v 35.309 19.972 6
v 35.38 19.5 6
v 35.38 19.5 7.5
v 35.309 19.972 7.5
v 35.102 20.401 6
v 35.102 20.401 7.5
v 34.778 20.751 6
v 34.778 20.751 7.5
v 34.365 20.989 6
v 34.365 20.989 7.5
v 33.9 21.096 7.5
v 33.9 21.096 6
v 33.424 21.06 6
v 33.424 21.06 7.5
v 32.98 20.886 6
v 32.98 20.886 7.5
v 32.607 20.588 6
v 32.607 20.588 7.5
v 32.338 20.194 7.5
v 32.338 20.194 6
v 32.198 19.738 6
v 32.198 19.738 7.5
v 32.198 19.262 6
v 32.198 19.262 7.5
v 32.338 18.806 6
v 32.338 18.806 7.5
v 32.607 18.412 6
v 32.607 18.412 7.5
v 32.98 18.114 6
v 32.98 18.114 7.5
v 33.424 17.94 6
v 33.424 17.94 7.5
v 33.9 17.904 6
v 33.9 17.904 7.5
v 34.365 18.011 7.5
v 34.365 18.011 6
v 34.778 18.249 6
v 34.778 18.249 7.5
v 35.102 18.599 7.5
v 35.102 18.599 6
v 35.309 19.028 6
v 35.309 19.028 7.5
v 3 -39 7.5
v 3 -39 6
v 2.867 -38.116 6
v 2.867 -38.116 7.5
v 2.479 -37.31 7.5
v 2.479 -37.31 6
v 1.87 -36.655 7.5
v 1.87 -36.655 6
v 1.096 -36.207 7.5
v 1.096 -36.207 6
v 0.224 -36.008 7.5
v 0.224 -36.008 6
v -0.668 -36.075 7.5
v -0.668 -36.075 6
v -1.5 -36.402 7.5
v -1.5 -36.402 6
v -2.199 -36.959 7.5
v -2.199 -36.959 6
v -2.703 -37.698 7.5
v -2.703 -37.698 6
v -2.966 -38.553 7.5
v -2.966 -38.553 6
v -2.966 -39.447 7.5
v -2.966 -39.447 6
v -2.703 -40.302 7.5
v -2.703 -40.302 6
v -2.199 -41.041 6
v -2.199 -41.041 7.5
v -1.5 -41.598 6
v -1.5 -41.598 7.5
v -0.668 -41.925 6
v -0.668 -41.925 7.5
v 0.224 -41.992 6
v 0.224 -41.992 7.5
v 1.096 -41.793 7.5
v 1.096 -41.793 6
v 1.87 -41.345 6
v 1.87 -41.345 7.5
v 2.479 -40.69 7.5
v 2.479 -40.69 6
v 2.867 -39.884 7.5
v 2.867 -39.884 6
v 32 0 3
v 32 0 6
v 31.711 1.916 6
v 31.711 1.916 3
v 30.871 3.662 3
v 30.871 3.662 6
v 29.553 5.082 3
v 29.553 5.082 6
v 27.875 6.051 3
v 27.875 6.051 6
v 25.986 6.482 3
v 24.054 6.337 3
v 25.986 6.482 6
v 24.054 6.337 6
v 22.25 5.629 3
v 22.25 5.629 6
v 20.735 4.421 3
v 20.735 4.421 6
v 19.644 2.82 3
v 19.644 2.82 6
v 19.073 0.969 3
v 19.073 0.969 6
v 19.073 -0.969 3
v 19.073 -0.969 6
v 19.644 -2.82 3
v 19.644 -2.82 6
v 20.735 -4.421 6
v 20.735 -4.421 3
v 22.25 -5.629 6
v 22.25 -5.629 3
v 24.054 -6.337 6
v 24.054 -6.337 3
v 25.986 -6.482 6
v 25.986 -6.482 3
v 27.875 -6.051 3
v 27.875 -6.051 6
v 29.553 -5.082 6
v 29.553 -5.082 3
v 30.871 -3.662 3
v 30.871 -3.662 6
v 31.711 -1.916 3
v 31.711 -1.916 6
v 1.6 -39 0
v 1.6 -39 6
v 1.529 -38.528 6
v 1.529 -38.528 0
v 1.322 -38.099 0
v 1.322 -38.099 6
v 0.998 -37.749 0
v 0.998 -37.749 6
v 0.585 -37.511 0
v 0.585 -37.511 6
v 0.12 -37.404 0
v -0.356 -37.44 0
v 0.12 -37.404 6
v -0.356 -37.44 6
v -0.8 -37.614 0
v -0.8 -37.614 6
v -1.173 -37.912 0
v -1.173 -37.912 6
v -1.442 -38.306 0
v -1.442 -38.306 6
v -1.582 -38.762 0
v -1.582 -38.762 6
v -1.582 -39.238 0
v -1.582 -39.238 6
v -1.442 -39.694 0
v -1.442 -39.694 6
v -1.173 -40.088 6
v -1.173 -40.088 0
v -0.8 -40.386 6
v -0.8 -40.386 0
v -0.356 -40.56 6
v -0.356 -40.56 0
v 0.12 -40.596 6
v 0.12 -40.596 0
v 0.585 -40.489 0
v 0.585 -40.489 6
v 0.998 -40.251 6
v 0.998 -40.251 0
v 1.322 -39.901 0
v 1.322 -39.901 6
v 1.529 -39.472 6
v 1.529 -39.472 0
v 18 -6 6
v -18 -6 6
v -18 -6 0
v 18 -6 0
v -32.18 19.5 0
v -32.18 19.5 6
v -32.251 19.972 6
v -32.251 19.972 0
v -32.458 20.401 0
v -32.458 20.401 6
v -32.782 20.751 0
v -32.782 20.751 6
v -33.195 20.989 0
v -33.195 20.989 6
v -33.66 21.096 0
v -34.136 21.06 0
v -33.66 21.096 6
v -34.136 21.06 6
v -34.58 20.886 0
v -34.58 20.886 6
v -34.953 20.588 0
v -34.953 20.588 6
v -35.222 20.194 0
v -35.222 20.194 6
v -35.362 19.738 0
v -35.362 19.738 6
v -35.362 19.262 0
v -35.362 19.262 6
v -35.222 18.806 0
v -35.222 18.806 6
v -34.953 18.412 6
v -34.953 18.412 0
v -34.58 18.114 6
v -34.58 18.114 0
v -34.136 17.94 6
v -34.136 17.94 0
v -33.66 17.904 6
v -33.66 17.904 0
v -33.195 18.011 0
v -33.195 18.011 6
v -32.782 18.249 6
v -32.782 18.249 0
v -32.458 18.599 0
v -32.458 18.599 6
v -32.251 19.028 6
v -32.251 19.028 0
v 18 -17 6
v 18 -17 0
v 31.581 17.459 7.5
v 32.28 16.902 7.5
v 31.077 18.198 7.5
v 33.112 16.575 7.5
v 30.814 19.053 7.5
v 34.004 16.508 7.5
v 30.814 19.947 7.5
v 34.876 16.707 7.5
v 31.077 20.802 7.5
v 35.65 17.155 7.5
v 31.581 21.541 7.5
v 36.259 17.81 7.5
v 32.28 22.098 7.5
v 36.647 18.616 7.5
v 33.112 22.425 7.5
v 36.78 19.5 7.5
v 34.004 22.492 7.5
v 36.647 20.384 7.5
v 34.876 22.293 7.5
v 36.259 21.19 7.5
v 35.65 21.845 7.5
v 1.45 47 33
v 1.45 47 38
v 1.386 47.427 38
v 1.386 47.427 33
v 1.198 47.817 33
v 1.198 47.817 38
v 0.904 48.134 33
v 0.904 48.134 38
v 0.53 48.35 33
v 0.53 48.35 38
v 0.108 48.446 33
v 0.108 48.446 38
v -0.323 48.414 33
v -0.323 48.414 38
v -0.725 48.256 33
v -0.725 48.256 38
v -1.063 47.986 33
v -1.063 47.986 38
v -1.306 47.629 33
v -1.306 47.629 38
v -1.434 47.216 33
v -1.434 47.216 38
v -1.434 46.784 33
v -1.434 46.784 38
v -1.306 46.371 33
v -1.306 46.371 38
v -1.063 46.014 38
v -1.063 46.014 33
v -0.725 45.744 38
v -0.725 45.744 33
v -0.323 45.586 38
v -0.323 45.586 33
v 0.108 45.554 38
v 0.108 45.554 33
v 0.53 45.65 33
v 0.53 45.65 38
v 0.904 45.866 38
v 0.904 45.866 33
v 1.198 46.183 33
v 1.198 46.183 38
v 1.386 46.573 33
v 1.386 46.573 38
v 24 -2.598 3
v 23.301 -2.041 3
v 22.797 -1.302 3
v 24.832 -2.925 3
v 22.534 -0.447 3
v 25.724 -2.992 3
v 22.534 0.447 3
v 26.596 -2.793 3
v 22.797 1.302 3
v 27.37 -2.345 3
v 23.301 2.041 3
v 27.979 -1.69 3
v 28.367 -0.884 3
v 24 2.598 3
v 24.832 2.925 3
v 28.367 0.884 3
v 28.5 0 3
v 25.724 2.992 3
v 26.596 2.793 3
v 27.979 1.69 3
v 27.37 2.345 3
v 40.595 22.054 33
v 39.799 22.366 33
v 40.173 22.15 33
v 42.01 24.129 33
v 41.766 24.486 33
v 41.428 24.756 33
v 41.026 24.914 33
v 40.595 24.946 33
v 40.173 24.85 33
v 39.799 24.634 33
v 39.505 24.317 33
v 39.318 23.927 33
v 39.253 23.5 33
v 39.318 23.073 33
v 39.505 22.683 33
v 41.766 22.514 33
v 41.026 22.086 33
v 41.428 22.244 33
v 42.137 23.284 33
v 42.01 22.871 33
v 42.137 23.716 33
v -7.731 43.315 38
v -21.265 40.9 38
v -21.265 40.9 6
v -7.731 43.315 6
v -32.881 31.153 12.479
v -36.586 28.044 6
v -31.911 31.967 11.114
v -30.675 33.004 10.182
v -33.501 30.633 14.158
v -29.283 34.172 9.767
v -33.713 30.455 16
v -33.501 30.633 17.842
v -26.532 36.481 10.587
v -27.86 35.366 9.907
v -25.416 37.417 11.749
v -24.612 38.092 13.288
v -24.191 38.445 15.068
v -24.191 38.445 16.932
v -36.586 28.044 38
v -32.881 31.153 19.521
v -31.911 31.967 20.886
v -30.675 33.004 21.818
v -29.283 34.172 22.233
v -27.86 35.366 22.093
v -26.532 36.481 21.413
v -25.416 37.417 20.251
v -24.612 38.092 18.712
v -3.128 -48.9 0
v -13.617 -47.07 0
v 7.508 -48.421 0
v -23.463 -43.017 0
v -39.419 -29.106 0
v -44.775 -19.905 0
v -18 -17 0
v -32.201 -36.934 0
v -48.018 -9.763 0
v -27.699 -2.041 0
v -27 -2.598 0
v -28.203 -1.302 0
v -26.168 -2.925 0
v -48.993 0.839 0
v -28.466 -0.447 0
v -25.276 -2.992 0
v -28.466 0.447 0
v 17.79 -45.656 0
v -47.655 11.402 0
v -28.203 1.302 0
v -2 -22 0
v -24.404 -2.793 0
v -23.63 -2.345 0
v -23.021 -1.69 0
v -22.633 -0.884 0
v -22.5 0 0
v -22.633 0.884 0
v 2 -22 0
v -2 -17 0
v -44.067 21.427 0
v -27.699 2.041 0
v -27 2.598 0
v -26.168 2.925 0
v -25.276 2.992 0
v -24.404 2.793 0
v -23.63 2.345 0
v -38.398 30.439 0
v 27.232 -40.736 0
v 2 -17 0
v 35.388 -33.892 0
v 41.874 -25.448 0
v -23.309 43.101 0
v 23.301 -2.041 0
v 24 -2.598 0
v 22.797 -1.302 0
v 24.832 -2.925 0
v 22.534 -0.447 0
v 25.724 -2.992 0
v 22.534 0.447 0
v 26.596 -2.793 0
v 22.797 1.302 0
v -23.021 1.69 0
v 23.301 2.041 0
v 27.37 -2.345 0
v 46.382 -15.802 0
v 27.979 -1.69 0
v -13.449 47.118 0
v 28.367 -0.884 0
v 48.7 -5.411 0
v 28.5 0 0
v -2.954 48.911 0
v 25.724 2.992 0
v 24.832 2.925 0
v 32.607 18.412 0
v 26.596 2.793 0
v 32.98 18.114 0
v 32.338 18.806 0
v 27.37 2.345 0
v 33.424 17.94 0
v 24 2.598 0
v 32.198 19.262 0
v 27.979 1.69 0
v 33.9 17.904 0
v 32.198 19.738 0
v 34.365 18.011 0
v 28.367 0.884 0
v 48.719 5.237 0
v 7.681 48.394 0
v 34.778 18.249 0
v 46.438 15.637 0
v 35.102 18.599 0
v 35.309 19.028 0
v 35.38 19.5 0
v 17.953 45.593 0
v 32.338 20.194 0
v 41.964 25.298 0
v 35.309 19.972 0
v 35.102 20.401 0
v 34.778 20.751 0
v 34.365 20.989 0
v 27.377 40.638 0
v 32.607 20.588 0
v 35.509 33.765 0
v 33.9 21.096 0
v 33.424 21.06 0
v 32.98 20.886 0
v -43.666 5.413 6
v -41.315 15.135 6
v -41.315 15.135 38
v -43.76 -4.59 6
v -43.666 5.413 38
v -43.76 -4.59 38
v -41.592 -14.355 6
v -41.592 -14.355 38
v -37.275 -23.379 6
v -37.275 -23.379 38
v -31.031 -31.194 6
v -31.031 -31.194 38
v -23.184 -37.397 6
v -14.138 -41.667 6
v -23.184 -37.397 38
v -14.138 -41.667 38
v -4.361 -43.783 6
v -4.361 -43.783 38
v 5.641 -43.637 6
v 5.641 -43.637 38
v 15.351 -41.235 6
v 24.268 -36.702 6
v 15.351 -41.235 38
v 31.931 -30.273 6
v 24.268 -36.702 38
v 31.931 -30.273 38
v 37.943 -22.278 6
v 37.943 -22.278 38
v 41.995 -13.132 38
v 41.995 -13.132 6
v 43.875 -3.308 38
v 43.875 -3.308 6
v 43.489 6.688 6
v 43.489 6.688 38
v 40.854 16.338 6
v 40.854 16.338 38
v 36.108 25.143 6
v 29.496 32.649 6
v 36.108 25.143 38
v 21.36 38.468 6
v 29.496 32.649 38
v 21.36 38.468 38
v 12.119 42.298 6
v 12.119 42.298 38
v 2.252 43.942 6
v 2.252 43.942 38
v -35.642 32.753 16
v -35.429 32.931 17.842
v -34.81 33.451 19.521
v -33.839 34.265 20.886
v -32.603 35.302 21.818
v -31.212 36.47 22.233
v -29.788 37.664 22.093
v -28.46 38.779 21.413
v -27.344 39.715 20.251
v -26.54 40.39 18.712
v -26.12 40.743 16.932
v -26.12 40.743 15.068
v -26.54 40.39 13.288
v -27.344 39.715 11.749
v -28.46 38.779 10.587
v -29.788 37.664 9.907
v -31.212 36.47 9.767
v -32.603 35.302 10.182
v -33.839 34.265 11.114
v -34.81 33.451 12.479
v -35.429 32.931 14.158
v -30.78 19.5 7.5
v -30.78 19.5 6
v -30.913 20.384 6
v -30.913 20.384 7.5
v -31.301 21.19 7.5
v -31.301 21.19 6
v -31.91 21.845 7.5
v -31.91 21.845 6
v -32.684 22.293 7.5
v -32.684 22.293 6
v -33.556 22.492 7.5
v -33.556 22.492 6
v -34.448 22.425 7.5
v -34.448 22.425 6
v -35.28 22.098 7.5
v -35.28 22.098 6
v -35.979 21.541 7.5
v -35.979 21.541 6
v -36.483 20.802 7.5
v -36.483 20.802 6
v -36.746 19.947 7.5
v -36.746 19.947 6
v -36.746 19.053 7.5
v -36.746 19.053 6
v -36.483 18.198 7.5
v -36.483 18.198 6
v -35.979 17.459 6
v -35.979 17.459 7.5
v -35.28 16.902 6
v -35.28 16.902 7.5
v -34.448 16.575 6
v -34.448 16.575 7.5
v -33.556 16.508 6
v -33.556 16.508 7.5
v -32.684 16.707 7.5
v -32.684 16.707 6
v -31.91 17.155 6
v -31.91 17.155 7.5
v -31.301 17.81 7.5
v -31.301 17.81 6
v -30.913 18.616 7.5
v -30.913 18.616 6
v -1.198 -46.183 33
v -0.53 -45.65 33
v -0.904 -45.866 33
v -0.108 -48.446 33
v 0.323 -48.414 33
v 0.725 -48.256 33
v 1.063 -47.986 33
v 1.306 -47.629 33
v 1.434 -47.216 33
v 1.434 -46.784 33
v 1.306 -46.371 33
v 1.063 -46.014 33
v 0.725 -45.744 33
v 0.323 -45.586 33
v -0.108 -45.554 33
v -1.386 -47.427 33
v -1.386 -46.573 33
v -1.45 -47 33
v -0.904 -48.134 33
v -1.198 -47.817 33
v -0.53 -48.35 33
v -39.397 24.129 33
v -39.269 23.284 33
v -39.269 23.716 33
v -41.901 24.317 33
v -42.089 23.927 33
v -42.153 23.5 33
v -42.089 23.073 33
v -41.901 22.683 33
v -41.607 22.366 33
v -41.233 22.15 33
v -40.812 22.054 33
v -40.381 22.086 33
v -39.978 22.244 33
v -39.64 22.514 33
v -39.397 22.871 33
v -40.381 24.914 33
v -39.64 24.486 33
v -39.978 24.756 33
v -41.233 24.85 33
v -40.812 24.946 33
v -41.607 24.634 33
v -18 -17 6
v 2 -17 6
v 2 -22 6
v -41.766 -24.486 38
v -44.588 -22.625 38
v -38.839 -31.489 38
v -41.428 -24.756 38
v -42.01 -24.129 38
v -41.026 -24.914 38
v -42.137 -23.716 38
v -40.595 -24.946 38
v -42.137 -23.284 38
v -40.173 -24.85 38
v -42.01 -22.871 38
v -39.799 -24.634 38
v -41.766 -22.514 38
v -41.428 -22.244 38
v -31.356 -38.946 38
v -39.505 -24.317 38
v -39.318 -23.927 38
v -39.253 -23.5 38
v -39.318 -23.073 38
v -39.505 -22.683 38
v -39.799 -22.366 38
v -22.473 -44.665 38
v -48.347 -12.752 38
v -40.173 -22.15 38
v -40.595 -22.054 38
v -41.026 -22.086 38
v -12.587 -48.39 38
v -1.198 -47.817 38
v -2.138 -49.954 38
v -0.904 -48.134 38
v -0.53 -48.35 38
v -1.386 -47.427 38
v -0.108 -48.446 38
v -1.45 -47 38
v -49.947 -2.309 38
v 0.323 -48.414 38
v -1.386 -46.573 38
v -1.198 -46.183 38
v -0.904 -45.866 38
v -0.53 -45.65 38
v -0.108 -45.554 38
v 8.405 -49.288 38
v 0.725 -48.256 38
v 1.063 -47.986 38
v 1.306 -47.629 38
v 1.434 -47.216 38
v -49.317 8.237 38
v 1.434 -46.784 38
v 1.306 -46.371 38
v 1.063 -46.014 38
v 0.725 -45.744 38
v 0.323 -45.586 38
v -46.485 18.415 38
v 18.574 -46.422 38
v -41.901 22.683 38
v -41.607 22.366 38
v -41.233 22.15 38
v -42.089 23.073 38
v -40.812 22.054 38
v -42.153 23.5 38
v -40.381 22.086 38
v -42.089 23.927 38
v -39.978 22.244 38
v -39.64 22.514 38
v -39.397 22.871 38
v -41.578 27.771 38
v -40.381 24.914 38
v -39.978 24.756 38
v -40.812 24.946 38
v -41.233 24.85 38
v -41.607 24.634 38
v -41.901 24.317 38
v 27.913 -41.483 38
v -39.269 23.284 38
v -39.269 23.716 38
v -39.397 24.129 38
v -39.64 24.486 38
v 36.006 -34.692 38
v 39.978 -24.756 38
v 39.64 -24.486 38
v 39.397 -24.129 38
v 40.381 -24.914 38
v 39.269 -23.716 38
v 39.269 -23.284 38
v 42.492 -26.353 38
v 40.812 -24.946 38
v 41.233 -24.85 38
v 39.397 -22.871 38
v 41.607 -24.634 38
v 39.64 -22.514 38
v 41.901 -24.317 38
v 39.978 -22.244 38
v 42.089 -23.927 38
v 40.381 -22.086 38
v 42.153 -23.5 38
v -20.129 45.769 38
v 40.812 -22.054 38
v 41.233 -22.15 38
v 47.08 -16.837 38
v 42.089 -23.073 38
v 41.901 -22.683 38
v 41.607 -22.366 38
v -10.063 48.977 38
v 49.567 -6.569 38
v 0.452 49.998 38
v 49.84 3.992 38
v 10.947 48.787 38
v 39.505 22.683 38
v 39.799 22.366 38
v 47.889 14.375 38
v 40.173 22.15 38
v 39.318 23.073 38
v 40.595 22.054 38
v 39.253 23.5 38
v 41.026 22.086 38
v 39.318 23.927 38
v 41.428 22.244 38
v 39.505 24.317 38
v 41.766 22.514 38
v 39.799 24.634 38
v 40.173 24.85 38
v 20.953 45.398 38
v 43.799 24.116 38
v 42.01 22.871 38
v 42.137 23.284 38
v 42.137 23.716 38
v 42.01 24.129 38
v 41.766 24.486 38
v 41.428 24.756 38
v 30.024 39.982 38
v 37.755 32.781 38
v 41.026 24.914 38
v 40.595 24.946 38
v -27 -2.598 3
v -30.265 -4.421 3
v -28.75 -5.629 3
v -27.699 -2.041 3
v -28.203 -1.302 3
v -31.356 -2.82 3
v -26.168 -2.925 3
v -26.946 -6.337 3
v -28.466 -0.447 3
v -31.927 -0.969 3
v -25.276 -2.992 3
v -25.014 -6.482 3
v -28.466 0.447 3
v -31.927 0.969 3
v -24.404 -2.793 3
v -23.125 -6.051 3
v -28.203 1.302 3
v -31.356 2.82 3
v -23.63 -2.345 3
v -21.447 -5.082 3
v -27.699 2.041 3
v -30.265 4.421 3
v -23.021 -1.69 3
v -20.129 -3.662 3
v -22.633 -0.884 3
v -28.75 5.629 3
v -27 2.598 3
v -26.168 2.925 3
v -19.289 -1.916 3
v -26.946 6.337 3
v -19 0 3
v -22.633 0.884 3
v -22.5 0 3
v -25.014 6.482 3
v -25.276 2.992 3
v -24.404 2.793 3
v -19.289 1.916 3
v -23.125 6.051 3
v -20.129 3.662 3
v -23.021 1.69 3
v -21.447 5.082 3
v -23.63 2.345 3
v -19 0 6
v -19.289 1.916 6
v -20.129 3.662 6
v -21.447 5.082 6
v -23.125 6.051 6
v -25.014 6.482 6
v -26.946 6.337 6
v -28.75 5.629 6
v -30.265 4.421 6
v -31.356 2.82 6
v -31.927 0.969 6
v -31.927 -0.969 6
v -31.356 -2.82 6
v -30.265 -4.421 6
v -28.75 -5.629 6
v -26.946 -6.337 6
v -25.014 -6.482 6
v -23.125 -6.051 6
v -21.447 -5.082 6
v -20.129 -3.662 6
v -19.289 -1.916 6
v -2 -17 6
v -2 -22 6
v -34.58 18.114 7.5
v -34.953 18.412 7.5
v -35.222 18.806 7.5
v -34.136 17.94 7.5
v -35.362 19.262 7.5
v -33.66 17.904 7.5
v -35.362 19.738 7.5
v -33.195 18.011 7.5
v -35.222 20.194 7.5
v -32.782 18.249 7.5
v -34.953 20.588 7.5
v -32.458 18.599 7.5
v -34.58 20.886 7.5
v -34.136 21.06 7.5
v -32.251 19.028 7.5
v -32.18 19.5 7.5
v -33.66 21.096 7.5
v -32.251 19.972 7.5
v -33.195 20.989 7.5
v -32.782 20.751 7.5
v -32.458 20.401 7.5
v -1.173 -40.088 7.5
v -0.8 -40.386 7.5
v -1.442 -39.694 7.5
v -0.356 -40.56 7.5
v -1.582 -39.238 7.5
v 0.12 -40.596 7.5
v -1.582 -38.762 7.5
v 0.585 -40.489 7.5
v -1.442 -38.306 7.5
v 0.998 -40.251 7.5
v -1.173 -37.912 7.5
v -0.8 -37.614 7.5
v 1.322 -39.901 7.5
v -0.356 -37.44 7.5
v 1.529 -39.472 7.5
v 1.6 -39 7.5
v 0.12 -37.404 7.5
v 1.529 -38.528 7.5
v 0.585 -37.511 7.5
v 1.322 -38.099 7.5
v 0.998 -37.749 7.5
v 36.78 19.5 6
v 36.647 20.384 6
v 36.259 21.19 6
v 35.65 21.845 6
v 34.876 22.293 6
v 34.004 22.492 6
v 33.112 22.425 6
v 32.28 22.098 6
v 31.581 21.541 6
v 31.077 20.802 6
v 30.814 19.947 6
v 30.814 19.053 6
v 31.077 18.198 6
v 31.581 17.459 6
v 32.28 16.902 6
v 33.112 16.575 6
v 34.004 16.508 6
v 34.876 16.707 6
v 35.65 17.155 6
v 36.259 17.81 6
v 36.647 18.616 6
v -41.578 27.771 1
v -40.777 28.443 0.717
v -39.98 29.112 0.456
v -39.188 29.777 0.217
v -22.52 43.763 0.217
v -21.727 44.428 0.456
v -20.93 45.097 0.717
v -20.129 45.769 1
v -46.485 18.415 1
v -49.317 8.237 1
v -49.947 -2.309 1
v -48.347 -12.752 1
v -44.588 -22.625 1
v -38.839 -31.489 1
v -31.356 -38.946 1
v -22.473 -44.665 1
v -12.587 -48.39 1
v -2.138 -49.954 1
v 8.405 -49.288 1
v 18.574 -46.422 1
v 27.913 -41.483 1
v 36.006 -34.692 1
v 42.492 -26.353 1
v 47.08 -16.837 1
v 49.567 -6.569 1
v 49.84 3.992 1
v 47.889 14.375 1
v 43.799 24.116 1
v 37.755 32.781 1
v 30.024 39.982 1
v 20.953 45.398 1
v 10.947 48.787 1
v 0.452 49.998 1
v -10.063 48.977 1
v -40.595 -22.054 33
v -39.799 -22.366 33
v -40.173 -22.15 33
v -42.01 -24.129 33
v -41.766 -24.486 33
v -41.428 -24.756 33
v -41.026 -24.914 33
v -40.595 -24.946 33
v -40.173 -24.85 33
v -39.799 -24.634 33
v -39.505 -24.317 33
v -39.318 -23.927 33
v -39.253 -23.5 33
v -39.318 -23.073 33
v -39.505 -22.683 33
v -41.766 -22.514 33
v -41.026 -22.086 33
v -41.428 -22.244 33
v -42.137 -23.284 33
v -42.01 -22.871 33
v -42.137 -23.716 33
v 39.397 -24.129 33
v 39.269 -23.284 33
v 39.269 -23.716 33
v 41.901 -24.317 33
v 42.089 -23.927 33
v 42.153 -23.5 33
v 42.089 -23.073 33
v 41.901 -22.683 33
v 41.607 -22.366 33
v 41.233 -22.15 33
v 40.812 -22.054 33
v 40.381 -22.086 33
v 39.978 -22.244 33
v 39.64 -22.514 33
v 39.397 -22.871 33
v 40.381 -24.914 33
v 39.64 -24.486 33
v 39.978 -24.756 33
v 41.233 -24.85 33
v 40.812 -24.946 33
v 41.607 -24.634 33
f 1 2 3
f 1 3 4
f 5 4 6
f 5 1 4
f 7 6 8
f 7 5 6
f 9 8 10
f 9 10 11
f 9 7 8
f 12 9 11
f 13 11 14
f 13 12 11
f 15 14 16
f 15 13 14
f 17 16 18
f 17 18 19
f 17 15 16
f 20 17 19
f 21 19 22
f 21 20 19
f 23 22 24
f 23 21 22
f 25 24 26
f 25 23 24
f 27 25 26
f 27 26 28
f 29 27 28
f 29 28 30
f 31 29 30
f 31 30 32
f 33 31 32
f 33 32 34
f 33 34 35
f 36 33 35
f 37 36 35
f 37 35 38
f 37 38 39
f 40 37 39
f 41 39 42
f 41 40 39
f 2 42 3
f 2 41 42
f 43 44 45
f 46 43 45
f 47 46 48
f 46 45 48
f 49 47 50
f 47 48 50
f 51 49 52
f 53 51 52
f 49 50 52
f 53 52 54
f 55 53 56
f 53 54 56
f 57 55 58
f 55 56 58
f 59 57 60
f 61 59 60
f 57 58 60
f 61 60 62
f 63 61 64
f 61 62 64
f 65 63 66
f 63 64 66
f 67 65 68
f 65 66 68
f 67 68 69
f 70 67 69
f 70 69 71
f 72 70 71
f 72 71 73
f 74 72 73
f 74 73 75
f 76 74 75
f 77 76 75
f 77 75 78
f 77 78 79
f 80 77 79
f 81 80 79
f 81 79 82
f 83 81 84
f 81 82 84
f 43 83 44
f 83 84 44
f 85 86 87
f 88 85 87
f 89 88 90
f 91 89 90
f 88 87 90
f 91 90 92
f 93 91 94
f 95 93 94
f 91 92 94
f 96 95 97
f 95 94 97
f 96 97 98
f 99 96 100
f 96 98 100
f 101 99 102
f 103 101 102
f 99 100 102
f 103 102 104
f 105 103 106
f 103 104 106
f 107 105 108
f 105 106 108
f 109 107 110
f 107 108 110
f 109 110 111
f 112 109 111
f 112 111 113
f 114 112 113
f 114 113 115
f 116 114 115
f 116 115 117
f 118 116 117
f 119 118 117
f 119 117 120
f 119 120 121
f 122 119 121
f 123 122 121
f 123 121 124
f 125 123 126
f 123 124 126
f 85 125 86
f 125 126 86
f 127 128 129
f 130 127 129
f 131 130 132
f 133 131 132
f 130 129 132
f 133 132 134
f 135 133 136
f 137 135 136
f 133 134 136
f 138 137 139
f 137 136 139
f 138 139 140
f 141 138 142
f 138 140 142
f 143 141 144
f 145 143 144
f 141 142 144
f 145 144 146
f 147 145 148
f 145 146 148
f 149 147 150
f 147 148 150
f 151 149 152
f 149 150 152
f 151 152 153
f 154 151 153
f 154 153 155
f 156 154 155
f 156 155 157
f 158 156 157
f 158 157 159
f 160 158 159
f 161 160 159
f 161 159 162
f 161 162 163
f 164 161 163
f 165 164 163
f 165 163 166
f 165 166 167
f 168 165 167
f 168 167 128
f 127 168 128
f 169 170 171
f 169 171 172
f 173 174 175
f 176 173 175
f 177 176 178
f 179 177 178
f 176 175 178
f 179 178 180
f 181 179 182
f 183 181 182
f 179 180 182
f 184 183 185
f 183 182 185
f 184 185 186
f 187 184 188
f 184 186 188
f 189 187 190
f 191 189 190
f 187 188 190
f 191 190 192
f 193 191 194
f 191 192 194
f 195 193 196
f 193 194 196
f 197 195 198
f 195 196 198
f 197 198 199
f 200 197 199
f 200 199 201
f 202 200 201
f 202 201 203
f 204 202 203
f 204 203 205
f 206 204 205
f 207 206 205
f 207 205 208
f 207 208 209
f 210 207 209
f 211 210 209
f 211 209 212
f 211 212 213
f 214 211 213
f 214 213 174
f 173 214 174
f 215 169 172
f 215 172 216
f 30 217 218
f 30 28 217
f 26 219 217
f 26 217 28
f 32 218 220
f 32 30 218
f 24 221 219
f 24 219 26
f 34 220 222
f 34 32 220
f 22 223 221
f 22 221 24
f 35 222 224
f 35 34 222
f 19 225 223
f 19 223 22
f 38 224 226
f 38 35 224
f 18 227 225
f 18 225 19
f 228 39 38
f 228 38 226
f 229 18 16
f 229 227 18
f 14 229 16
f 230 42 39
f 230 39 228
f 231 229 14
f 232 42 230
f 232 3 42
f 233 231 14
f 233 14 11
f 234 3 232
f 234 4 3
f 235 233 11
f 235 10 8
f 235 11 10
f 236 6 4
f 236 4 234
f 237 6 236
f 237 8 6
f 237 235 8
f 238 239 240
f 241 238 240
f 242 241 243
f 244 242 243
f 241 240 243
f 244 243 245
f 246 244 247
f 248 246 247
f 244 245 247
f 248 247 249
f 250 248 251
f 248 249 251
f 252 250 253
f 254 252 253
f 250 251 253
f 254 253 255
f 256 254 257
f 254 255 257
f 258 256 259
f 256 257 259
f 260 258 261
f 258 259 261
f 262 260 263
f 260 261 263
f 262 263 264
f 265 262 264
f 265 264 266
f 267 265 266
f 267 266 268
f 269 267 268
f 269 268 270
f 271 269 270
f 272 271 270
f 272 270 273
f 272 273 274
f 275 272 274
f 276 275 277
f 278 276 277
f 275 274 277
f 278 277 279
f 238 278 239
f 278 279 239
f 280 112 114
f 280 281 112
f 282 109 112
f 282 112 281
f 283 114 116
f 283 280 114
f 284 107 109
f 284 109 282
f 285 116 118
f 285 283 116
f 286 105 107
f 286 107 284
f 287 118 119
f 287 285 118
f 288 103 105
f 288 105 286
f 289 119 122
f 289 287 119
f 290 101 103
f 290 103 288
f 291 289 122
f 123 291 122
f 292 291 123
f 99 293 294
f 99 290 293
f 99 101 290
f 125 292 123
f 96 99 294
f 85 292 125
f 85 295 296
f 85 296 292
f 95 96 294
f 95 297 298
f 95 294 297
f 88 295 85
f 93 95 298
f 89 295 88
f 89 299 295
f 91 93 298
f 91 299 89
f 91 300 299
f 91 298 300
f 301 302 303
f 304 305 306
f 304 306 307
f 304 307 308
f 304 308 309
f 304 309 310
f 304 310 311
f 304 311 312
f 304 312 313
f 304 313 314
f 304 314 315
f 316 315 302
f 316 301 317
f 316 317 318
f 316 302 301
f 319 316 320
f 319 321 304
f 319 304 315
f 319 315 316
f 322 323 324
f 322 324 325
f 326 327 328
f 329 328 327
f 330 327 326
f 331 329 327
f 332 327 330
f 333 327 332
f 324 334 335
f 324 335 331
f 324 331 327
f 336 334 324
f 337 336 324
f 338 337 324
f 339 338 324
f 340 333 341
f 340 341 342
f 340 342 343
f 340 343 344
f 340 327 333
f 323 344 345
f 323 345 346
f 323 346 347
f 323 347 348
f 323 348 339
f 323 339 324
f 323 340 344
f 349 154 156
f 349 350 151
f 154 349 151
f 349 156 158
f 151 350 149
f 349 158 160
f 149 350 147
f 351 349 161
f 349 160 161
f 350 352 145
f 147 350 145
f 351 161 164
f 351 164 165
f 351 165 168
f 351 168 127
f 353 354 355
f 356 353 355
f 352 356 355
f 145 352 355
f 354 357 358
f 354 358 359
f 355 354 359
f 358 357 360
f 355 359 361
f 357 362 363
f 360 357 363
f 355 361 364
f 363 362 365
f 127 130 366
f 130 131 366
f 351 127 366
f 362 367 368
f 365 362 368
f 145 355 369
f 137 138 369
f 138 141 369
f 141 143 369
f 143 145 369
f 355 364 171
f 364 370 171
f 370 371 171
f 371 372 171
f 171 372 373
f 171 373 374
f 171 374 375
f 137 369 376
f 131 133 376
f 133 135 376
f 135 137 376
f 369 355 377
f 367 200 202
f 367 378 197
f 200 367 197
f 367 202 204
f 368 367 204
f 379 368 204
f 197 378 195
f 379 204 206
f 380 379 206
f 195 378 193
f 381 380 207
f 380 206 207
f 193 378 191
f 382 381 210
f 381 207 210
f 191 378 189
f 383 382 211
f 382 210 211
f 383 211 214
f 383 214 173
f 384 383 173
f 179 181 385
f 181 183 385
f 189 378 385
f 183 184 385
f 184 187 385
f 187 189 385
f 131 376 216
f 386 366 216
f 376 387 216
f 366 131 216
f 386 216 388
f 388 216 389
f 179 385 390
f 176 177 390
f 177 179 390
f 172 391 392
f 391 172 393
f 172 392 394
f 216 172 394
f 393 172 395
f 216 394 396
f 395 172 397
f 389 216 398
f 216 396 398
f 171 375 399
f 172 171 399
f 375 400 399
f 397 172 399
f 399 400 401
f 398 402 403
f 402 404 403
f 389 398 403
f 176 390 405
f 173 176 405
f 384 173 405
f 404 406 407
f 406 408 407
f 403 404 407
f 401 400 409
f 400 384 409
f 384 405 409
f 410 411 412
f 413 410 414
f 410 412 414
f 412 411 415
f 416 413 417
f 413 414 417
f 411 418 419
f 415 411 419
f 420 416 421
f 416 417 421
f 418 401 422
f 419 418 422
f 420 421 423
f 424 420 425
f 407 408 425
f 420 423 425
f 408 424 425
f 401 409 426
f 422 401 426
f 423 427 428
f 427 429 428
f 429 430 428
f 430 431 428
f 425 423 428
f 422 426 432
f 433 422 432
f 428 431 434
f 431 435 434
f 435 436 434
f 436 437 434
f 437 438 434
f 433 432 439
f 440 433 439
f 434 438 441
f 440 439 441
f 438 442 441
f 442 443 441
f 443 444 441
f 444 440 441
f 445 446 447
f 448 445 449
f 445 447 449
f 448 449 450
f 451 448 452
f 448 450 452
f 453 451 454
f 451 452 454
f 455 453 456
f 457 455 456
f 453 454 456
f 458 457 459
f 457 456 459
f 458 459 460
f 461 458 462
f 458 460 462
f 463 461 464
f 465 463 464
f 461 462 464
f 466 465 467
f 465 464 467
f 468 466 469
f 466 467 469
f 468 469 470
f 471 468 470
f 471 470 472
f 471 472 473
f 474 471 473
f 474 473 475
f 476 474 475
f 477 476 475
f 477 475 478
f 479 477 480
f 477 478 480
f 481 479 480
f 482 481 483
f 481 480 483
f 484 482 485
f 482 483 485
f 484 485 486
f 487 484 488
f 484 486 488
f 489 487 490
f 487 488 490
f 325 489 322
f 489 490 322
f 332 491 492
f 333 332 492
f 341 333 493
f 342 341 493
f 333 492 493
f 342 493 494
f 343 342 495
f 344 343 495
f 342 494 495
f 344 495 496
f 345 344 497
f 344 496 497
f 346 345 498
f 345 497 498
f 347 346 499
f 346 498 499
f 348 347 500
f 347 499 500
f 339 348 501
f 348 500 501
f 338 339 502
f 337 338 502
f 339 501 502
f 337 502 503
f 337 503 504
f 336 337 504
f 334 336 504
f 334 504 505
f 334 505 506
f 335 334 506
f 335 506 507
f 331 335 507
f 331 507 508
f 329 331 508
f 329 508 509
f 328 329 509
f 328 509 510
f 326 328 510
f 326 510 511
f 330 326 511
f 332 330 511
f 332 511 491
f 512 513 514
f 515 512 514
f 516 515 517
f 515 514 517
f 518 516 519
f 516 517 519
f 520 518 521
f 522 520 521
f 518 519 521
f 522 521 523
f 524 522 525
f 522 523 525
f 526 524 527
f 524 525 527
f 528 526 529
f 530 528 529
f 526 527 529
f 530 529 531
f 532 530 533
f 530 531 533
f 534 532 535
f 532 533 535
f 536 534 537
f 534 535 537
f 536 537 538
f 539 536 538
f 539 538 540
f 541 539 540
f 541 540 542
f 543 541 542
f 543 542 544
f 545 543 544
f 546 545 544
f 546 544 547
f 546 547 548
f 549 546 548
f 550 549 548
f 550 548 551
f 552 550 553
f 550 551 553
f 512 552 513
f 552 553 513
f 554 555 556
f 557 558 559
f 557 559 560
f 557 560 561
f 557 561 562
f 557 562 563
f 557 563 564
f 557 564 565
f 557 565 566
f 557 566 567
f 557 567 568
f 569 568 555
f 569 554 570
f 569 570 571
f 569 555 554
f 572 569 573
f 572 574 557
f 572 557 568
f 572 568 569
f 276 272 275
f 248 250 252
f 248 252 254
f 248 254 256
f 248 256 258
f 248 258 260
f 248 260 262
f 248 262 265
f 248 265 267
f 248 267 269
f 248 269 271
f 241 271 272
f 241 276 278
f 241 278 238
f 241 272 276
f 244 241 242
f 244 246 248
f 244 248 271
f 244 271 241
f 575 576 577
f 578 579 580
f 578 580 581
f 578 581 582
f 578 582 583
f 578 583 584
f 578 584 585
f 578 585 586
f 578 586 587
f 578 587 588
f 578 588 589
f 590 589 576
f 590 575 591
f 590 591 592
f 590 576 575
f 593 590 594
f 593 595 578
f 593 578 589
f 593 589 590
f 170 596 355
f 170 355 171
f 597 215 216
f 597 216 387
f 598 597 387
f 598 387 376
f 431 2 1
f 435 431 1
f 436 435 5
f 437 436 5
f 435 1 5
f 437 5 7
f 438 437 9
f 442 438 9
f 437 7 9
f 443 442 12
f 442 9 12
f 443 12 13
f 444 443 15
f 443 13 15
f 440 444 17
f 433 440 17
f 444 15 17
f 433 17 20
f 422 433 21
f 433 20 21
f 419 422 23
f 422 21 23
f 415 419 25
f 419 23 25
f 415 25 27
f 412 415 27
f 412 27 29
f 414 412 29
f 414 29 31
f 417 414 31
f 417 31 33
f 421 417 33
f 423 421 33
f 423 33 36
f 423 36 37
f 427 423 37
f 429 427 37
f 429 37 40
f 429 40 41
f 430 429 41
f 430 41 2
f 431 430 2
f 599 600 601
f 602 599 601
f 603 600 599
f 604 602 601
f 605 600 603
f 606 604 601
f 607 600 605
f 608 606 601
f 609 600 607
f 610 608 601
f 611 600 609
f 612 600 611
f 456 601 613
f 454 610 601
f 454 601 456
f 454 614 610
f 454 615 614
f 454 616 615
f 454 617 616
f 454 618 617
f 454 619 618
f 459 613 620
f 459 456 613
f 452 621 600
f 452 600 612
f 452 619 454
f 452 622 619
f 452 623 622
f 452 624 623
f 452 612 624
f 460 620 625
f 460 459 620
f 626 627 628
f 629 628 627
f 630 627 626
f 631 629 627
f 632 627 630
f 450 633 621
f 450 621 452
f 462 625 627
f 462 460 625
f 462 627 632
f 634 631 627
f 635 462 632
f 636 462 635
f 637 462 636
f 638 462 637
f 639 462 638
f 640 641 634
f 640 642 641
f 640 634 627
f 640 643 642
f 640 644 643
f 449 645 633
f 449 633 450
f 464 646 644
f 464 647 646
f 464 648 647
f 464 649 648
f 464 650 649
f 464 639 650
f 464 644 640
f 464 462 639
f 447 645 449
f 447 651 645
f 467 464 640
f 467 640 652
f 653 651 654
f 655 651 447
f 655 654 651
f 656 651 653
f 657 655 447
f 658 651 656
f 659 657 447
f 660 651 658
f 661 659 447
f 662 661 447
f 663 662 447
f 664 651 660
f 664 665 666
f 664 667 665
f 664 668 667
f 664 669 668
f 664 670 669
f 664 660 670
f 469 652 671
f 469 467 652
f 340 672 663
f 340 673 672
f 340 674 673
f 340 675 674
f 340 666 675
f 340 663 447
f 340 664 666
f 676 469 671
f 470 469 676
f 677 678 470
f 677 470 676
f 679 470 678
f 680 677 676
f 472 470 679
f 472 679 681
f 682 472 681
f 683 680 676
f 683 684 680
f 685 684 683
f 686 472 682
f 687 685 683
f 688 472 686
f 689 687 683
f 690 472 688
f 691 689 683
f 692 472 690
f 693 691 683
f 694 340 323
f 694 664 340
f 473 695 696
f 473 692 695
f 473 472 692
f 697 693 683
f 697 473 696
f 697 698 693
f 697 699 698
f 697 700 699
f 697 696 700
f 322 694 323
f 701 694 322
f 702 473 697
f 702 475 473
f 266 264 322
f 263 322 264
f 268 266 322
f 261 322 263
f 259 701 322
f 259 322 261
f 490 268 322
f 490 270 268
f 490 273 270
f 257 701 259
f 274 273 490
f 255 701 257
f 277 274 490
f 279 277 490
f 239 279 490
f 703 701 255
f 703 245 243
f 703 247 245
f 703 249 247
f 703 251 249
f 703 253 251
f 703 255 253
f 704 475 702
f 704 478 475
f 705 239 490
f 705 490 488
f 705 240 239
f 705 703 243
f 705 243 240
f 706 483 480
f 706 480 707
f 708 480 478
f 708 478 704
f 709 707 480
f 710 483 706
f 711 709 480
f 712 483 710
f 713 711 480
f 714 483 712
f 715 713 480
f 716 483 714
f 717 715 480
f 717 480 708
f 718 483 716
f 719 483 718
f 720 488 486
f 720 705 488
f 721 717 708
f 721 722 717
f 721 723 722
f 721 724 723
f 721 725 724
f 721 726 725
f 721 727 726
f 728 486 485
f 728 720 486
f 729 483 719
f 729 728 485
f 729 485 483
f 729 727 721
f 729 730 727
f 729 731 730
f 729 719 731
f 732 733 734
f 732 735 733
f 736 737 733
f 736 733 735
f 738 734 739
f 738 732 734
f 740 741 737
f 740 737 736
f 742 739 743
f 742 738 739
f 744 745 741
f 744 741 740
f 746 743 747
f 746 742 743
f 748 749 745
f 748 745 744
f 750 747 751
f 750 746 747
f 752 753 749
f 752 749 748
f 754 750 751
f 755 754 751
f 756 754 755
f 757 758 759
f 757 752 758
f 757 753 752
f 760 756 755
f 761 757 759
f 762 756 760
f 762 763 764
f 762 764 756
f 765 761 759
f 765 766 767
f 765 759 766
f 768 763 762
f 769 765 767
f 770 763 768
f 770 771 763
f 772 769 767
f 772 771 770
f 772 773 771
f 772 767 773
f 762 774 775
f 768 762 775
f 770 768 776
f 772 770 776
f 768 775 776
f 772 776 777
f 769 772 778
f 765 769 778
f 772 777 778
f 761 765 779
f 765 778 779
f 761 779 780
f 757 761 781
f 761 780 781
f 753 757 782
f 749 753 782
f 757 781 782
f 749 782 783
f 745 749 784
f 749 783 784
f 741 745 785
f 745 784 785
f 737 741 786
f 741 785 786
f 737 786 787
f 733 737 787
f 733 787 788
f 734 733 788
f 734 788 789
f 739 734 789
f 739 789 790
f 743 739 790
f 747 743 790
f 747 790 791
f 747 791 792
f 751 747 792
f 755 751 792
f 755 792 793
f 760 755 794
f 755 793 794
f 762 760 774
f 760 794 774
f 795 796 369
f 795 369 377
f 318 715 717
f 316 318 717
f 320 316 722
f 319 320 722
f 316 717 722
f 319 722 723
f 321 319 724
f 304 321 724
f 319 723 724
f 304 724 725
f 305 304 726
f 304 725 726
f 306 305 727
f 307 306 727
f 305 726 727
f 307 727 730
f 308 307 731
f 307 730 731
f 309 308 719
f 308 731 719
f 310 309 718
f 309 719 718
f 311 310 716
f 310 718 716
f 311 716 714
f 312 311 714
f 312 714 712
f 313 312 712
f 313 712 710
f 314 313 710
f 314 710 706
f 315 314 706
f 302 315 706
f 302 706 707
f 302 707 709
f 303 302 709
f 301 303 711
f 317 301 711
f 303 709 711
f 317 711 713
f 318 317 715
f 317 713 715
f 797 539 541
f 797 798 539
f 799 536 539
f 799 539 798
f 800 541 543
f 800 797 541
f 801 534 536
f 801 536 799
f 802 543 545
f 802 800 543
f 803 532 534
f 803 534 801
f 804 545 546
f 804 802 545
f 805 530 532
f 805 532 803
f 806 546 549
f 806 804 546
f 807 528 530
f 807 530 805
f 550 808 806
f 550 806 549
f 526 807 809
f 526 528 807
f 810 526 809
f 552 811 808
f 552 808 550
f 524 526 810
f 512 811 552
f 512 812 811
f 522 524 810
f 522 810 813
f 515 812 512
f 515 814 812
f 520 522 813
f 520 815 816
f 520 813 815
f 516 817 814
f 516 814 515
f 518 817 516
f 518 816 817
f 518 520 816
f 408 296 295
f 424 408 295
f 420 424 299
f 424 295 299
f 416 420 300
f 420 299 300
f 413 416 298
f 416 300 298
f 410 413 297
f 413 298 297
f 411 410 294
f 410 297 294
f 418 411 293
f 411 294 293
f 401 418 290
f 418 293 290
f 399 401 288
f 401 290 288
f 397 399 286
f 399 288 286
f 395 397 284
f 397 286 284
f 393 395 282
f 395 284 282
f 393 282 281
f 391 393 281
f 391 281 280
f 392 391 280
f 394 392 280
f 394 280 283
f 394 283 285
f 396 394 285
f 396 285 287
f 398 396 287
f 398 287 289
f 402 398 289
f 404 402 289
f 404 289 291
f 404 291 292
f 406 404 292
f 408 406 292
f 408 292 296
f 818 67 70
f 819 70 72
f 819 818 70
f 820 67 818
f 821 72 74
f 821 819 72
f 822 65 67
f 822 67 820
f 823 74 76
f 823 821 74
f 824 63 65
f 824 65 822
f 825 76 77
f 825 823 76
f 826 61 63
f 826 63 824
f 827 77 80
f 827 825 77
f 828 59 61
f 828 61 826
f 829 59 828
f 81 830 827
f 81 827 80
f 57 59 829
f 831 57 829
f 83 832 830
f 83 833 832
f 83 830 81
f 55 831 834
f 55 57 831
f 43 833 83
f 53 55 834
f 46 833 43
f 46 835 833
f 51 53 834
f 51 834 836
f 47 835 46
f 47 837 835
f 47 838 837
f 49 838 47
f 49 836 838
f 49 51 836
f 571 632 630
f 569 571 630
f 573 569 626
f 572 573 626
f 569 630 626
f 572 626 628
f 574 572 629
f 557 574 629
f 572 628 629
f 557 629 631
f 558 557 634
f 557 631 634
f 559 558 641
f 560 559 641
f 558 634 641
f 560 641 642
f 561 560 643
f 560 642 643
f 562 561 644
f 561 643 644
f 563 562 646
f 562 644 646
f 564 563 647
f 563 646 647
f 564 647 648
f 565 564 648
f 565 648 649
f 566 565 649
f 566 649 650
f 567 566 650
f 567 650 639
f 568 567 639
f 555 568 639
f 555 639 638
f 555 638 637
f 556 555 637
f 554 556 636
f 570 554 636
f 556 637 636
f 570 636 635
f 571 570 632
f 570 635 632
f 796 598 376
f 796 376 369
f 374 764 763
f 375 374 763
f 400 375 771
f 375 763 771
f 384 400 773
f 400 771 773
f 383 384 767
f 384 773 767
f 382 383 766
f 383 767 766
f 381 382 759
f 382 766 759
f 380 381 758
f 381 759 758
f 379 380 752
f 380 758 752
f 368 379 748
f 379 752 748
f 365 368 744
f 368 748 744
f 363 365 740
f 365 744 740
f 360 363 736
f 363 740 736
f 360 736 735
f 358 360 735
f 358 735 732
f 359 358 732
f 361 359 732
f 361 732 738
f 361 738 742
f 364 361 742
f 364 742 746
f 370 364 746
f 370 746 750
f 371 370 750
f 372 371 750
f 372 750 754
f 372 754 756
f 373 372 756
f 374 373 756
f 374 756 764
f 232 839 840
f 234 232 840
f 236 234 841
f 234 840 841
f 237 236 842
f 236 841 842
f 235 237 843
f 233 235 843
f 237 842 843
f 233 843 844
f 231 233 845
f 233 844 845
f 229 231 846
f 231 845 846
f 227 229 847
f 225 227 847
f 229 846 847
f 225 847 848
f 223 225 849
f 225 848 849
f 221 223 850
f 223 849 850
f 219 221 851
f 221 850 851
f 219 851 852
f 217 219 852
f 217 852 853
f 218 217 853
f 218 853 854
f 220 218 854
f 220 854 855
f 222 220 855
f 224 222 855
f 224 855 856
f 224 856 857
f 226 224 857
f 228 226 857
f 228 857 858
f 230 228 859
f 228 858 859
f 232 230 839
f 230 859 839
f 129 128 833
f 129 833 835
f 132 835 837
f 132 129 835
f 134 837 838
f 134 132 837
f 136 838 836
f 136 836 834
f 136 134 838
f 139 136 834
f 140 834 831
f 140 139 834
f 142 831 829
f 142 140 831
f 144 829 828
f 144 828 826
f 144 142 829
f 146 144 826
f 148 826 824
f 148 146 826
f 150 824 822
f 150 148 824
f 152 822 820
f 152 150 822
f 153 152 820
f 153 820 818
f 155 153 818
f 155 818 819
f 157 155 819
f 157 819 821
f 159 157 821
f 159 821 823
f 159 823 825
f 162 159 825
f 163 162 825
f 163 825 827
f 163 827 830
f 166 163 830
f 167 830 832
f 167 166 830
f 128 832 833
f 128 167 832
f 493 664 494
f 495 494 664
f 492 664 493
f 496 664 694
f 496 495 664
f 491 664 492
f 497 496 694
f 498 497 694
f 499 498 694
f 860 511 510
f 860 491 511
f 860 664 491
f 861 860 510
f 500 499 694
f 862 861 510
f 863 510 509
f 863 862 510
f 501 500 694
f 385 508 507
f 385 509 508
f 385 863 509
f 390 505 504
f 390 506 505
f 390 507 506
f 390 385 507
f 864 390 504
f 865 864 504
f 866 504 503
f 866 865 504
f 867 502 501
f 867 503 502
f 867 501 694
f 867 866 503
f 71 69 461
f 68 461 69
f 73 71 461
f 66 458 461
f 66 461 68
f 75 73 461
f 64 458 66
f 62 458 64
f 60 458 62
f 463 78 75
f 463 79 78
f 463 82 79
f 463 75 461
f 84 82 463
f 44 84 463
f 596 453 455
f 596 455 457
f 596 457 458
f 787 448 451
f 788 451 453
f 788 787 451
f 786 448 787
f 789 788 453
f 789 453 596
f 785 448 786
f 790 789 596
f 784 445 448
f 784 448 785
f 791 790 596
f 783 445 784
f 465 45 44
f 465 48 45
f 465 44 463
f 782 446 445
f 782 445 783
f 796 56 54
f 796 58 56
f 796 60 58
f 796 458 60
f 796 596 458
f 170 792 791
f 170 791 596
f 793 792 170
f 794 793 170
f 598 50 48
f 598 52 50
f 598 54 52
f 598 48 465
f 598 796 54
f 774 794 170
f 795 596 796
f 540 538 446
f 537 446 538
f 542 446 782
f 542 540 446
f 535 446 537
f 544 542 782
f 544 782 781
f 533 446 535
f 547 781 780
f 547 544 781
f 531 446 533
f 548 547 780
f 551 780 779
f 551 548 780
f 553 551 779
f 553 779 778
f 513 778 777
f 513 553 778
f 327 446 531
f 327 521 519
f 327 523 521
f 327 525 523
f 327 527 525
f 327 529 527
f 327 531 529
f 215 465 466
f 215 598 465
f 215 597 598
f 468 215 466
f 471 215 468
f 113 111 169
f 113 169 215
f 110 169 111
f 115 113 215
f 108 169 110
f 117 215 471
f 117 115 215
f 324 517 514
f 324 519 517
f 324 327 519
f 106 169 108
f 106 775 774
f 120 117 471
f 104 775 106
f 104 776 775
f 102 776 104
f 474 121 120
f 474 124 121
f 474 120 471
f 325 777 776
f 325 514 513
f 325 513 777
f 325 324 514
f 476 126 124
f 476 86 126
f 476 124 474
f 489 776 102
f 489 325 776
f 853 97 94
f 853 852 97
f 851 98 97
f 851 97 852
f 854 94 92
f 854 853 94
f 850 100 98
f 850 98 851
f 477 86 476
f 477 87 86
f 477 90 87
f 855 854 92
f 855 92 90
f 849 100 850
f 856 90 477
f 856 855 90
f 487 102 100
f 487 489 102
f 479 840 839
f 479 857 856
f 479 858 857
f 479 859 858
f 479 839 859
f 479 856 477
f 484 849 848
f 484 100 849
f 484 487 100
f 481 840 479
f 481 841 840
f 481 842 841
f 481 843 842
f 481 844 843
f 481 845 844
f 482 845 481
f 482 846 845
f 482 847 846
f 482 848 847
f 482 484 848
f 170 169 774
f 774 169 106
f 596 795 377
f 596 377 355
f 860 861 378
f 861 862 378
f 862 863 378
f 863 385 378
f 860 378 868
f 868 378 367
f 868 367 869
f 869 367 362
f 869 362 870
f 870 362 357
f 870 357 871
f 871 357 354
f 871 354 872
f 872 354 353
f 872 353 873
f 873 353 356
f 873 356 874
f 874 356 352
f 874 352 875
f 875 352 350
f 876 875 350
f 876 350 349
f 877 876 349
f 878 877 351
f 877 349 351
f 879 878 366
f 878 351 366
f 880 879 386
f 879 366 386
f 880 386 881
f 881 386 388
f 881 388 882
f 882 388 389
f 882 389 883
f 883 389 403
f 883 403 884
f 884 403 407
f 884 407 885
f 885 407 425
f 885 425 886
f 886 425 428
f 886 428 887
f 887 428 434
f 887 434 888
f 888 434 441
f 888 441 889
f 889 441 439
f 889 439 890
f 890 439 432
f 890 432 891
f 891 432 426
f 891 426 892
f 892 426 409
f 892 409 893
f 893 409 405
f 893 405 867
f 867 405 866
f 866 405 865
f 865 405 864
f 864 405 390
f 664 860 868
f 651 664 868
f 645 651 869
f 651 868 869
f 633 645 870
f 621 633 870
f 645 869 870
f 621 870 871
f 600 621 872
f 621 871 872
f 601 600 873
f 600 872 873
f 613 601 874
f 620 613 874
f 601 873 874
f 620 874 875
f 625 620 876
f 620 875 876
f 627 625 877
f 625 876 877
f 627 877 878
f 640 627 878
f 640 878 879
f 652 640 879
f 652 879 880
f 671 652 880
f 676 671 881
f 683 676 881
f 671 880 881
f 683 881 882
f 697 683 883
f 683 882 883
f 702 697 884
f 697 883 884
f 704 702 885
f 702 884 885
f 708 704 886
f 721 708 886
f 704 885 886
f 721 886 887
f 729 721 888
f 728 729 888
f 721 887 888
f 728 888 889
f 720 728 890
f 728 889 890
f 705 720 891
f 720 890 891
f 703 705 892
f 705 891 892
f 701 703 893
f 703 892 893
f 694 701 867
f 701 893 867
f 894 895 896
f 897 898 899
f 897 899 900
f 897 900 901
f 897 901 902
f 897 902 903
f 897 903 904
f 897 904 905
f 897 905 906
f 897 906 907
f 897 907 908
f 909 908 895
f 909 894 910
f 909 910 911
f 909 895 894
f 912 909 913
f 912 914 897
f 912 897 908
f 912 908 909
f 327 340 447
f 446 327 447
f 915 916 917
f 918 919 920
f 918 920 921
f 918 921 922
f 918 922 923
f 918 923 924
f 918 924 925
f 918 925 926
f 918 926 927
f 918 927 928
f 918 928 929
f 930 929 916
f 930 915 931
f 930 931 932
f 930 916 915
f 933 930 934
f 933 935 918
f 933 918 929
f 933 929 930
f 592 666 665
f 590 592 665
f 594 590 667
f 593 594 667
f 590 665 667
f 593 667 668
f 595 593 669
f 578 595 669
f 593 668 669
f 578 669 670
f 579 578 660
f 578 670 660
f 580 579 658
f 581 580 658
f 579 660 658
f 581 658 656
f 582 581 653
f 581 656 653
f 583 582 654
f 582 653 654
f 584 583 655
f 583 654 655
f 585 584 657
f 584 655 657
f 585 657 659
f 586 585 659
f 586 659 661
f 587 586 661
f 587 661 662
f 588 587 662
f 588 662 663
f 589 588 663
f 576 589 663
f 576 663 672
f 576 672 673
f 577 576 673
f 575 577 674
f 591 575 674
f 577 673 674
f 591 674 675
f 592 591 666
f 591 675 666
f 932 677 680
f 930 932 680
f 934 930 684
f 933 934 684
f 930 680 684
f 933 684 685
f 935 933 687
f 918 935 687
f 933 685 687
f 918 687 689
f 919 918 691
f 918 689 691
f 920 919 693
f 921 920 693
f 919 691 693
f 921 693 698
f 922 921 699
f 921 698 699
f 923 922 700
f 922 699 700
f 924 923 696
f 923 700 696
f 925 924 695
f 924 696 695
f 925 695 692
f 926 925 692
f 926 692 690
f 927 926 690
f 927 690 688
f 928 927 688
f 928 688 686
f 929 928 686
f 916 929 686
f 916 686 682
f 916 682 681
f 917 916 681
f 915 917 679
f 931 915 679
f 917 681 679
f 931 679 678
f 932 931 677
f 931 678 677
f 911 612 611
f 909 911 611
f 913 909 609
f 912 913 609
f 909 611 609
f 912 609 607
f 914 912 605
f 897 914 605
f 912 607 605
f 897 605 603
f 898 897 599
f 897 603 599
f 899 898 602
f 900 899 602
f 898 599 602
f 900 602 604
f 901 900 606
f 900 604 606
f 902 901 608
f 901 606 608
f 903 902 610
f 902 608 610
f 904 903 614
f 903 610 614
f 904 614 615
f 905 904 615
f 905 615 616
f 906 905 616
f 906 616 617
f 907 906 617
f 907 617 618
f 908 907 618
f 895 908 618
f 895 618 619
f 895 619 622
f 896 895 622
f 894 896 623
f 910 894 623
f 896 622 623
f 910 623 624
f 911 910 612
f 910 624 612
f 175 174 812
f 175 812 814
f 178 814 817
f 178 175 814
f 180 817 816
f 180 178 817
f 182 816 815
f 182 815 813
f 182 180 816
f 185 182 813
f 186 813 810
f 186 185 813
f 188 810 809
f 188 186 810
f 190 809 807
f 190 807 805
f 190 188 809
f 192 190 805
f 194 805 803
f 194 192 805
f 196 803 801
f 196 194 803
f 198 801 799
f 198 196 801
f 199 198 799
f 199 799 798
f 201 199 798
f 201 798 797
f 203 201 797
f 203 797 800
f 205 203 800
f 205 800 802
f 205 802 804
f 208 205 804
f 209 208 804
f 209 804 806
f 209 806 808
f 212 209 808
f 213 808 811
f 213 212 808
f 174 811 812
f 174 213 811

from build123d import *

# Parameters (mm, degrees)
PAD_DEPTH          = 38
POCKET_DEPTH       = 32
SKETCH002_R        = 6.25
POCKET001_DEPTH    = 6
CHAMFER_SIZE       = 1
SKETCH003_R        = 1.6
SKETCH003_R_2      = 3
POCKET002_DEPTH    = 7
SKETCH004_R        = 6.5
POCKET003_DEPTH    = 3
SKETCH005_R        = 1.45
POCKET004_DEPTH    = 5
POLARPATTERN_COUNT = 6
SKETCH006_R        = 3
SKETCH006_R_2      = 1.6
PAD001_DEPTH       = 1.5


with BuildPart() as part:
    # Sketch → Pad (new body)
    with BuildSketch(Plane.XY):
        with BuildLine():
            ThreePointArc((-41.5784274686, 27.7711067341), (32.1393804843, -38.3022221559), (-20.1291830613, 45.7691598053))
            Line((-41.5784274686, 27.7711067341), (-20.1291830613, 45.7691598053))
        make_face()
    extrude(amount=PAD_DEPTH)

    # Sketch001 → Pocket (cut)
    with BuildSketch(Plane.XY.offset(38)):
        with BuildLine():
            ThreePointArc((-41.314902238, 15.1353511047), (28.2826548262, -33.7059554972), (-7.7311536284, 43.3154621766))
            Line((-21.2649980047, 40.8998760372), (-7.7311536284, 43.3154621766))
            Line((-36.5858868671, 28.0441238435), (-21.2649980047, 40.8998760372))
            Line((-36.5858868671, 28.0441238435), (-41.314902238, 15.1353511047))
        make_face()
    extrude(amount=-POCKET_DEPTH, mode=Mode.SUBTRACT)

    # Sketch002 (on Face2 of Pocket) → Pocket001 (cut)
    with BuildSketch(Plane(origin=(-30.853805265, 36.7701332697, 0), x_dir=(-0.7660444431, -0.6427876097, 0), z_dir=(-0.6427876097, 0.7660444431, 0))):
        with Locations((0, 16)):
            Circle(SKETCH002_R)
    extrude(amount=-POCKET001_DEPTH, mode=Mode.SUBTRACT)

    # Chamfer
    chamfer_edges = [part.edges().sort_by_distance(p)[0] for p in [
        (32.13938, -38.302222, 0),
    ]]
    chamfer(chamfer_edges, length=CHAMFER_SIZE)

    # Sketch003 → Pocket002 (cut)
    with BuildSketch(Plane.XY.offset(6)):
        with Locations((-33.78, 19.5)):
            Circle(SKETCH003_R)
        with Locations((33.78, 19.5)):
            Circle(SKETCH003_R)
        with Locations((0, -39)):
            Circle(SKETCH003_R)
        with Locations((-25.5, 0)):
            Circle(SKETCH003_R_2)
        with Locations((25.5, 0)):
            Circle(SKETCH003_R_2)
        Polygon((-18, -6), (18, -6), (18, -17), (2, -17), (2, -22), (-2, -22), (-2, -17), (-18, -17), align=None)
    extrude(amount=-POCKET002_DEPTH, mode=Mode.SUBTRACT)

    # Sketch004 → Pocket003 (cut)
    with BuildSketch(Plane.XY.offset(6)):
        with Locations((-25.5, 0)):
            Circle(SKETCH004_R)
        with Locations((25.5, 0)):
            Circle(SKETCH004_R)
    extrude(amount=-POCKET003_DEPTH, mode=Mode.SUBTRACT)

    # Sketch005 (on Face4 of Pocket003) → Pocket004 (cut)
    with BuildSketch(Plane.XY.offset(38)):
        with Locations((0, 47)):
            Circle(SKETCH005_R)
    pocket004 = extrude(amount=-POCKET004_DEPTH, mode=Mode.SUBTRACT)

    # PolarPattern: Pocket004 ×6 about axis
    polarpattern_axis = Axis((0, 0, 38), (0, 0, 1))
    for i in range(1, POLARPATTERN_COUNT):
        add(pocket004.rotate(polarpattern_axis, i * 360 / POLARPATTERN_COUNT), mode=Mode.SUBTRACT)

    # Sketch006 (on Face34 of PolarPattern) → Pad001 (join)
    with BuildSketch(Plane.XY.offset(6)):
        with Locations((-33.78, 19.5)):
            Circle(SKETCH006_R)
        with Locations((-33.78, 19.5)):
            Circle(SKETCH006_R_2, mode=Mode.SUBTRACT)
        with Locations((33.78, 19.5)):
            Circle(SKETCH006_R)
        with Locations((33.78, 19.5)):
            Circle(SKETCH006_R_2, mode=Mode.SUBTRACT)
        with Locations((0, -39)):
            Circle(SKETCH006_R)
        with Locations((0, -39)):
            Circle(SKETCH006_R_2, mode=Mode.SUBTRACT)
    extrude(amount=PAD001_DEPTH)


solid = part.part
